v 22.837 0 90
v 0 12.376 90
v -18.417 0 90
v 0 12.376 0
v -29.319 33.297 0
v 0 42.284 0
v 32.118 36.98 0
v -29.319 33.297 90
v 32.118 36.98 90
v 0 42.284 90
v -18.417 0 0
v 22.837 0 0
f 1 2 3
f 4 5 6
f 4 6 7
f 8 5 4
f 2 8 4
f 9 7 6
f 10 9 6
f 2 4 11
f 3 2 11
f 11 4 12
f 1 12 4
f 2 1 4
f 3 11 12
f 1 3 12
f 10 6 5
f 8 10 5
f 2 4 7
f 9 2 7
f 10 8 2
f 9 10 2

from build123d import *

# Parameters (mm, degrees)
F1_DEPTH = 90


with BuildPart() as f1:
    # F0 (on Top) → F1 (new body)
    with BuildSketch(Plane.XY):
        Polygon((32.11844, 36.98042), (0, 42.284384), (0, 12.375921), align=None)
        Polygon((22.836506, 0), (0, 12.375921), (0, 0), align=None)
        Polygon((0, 0), (0, 12.375921), (-18.416539, 0), align=None)
        Polygon((0, 12.375921), (0, 42.284384), (-29.31913, 33.297114), align=None)
    extrude(amount=F1_DEPTH)


solid = f1.part
